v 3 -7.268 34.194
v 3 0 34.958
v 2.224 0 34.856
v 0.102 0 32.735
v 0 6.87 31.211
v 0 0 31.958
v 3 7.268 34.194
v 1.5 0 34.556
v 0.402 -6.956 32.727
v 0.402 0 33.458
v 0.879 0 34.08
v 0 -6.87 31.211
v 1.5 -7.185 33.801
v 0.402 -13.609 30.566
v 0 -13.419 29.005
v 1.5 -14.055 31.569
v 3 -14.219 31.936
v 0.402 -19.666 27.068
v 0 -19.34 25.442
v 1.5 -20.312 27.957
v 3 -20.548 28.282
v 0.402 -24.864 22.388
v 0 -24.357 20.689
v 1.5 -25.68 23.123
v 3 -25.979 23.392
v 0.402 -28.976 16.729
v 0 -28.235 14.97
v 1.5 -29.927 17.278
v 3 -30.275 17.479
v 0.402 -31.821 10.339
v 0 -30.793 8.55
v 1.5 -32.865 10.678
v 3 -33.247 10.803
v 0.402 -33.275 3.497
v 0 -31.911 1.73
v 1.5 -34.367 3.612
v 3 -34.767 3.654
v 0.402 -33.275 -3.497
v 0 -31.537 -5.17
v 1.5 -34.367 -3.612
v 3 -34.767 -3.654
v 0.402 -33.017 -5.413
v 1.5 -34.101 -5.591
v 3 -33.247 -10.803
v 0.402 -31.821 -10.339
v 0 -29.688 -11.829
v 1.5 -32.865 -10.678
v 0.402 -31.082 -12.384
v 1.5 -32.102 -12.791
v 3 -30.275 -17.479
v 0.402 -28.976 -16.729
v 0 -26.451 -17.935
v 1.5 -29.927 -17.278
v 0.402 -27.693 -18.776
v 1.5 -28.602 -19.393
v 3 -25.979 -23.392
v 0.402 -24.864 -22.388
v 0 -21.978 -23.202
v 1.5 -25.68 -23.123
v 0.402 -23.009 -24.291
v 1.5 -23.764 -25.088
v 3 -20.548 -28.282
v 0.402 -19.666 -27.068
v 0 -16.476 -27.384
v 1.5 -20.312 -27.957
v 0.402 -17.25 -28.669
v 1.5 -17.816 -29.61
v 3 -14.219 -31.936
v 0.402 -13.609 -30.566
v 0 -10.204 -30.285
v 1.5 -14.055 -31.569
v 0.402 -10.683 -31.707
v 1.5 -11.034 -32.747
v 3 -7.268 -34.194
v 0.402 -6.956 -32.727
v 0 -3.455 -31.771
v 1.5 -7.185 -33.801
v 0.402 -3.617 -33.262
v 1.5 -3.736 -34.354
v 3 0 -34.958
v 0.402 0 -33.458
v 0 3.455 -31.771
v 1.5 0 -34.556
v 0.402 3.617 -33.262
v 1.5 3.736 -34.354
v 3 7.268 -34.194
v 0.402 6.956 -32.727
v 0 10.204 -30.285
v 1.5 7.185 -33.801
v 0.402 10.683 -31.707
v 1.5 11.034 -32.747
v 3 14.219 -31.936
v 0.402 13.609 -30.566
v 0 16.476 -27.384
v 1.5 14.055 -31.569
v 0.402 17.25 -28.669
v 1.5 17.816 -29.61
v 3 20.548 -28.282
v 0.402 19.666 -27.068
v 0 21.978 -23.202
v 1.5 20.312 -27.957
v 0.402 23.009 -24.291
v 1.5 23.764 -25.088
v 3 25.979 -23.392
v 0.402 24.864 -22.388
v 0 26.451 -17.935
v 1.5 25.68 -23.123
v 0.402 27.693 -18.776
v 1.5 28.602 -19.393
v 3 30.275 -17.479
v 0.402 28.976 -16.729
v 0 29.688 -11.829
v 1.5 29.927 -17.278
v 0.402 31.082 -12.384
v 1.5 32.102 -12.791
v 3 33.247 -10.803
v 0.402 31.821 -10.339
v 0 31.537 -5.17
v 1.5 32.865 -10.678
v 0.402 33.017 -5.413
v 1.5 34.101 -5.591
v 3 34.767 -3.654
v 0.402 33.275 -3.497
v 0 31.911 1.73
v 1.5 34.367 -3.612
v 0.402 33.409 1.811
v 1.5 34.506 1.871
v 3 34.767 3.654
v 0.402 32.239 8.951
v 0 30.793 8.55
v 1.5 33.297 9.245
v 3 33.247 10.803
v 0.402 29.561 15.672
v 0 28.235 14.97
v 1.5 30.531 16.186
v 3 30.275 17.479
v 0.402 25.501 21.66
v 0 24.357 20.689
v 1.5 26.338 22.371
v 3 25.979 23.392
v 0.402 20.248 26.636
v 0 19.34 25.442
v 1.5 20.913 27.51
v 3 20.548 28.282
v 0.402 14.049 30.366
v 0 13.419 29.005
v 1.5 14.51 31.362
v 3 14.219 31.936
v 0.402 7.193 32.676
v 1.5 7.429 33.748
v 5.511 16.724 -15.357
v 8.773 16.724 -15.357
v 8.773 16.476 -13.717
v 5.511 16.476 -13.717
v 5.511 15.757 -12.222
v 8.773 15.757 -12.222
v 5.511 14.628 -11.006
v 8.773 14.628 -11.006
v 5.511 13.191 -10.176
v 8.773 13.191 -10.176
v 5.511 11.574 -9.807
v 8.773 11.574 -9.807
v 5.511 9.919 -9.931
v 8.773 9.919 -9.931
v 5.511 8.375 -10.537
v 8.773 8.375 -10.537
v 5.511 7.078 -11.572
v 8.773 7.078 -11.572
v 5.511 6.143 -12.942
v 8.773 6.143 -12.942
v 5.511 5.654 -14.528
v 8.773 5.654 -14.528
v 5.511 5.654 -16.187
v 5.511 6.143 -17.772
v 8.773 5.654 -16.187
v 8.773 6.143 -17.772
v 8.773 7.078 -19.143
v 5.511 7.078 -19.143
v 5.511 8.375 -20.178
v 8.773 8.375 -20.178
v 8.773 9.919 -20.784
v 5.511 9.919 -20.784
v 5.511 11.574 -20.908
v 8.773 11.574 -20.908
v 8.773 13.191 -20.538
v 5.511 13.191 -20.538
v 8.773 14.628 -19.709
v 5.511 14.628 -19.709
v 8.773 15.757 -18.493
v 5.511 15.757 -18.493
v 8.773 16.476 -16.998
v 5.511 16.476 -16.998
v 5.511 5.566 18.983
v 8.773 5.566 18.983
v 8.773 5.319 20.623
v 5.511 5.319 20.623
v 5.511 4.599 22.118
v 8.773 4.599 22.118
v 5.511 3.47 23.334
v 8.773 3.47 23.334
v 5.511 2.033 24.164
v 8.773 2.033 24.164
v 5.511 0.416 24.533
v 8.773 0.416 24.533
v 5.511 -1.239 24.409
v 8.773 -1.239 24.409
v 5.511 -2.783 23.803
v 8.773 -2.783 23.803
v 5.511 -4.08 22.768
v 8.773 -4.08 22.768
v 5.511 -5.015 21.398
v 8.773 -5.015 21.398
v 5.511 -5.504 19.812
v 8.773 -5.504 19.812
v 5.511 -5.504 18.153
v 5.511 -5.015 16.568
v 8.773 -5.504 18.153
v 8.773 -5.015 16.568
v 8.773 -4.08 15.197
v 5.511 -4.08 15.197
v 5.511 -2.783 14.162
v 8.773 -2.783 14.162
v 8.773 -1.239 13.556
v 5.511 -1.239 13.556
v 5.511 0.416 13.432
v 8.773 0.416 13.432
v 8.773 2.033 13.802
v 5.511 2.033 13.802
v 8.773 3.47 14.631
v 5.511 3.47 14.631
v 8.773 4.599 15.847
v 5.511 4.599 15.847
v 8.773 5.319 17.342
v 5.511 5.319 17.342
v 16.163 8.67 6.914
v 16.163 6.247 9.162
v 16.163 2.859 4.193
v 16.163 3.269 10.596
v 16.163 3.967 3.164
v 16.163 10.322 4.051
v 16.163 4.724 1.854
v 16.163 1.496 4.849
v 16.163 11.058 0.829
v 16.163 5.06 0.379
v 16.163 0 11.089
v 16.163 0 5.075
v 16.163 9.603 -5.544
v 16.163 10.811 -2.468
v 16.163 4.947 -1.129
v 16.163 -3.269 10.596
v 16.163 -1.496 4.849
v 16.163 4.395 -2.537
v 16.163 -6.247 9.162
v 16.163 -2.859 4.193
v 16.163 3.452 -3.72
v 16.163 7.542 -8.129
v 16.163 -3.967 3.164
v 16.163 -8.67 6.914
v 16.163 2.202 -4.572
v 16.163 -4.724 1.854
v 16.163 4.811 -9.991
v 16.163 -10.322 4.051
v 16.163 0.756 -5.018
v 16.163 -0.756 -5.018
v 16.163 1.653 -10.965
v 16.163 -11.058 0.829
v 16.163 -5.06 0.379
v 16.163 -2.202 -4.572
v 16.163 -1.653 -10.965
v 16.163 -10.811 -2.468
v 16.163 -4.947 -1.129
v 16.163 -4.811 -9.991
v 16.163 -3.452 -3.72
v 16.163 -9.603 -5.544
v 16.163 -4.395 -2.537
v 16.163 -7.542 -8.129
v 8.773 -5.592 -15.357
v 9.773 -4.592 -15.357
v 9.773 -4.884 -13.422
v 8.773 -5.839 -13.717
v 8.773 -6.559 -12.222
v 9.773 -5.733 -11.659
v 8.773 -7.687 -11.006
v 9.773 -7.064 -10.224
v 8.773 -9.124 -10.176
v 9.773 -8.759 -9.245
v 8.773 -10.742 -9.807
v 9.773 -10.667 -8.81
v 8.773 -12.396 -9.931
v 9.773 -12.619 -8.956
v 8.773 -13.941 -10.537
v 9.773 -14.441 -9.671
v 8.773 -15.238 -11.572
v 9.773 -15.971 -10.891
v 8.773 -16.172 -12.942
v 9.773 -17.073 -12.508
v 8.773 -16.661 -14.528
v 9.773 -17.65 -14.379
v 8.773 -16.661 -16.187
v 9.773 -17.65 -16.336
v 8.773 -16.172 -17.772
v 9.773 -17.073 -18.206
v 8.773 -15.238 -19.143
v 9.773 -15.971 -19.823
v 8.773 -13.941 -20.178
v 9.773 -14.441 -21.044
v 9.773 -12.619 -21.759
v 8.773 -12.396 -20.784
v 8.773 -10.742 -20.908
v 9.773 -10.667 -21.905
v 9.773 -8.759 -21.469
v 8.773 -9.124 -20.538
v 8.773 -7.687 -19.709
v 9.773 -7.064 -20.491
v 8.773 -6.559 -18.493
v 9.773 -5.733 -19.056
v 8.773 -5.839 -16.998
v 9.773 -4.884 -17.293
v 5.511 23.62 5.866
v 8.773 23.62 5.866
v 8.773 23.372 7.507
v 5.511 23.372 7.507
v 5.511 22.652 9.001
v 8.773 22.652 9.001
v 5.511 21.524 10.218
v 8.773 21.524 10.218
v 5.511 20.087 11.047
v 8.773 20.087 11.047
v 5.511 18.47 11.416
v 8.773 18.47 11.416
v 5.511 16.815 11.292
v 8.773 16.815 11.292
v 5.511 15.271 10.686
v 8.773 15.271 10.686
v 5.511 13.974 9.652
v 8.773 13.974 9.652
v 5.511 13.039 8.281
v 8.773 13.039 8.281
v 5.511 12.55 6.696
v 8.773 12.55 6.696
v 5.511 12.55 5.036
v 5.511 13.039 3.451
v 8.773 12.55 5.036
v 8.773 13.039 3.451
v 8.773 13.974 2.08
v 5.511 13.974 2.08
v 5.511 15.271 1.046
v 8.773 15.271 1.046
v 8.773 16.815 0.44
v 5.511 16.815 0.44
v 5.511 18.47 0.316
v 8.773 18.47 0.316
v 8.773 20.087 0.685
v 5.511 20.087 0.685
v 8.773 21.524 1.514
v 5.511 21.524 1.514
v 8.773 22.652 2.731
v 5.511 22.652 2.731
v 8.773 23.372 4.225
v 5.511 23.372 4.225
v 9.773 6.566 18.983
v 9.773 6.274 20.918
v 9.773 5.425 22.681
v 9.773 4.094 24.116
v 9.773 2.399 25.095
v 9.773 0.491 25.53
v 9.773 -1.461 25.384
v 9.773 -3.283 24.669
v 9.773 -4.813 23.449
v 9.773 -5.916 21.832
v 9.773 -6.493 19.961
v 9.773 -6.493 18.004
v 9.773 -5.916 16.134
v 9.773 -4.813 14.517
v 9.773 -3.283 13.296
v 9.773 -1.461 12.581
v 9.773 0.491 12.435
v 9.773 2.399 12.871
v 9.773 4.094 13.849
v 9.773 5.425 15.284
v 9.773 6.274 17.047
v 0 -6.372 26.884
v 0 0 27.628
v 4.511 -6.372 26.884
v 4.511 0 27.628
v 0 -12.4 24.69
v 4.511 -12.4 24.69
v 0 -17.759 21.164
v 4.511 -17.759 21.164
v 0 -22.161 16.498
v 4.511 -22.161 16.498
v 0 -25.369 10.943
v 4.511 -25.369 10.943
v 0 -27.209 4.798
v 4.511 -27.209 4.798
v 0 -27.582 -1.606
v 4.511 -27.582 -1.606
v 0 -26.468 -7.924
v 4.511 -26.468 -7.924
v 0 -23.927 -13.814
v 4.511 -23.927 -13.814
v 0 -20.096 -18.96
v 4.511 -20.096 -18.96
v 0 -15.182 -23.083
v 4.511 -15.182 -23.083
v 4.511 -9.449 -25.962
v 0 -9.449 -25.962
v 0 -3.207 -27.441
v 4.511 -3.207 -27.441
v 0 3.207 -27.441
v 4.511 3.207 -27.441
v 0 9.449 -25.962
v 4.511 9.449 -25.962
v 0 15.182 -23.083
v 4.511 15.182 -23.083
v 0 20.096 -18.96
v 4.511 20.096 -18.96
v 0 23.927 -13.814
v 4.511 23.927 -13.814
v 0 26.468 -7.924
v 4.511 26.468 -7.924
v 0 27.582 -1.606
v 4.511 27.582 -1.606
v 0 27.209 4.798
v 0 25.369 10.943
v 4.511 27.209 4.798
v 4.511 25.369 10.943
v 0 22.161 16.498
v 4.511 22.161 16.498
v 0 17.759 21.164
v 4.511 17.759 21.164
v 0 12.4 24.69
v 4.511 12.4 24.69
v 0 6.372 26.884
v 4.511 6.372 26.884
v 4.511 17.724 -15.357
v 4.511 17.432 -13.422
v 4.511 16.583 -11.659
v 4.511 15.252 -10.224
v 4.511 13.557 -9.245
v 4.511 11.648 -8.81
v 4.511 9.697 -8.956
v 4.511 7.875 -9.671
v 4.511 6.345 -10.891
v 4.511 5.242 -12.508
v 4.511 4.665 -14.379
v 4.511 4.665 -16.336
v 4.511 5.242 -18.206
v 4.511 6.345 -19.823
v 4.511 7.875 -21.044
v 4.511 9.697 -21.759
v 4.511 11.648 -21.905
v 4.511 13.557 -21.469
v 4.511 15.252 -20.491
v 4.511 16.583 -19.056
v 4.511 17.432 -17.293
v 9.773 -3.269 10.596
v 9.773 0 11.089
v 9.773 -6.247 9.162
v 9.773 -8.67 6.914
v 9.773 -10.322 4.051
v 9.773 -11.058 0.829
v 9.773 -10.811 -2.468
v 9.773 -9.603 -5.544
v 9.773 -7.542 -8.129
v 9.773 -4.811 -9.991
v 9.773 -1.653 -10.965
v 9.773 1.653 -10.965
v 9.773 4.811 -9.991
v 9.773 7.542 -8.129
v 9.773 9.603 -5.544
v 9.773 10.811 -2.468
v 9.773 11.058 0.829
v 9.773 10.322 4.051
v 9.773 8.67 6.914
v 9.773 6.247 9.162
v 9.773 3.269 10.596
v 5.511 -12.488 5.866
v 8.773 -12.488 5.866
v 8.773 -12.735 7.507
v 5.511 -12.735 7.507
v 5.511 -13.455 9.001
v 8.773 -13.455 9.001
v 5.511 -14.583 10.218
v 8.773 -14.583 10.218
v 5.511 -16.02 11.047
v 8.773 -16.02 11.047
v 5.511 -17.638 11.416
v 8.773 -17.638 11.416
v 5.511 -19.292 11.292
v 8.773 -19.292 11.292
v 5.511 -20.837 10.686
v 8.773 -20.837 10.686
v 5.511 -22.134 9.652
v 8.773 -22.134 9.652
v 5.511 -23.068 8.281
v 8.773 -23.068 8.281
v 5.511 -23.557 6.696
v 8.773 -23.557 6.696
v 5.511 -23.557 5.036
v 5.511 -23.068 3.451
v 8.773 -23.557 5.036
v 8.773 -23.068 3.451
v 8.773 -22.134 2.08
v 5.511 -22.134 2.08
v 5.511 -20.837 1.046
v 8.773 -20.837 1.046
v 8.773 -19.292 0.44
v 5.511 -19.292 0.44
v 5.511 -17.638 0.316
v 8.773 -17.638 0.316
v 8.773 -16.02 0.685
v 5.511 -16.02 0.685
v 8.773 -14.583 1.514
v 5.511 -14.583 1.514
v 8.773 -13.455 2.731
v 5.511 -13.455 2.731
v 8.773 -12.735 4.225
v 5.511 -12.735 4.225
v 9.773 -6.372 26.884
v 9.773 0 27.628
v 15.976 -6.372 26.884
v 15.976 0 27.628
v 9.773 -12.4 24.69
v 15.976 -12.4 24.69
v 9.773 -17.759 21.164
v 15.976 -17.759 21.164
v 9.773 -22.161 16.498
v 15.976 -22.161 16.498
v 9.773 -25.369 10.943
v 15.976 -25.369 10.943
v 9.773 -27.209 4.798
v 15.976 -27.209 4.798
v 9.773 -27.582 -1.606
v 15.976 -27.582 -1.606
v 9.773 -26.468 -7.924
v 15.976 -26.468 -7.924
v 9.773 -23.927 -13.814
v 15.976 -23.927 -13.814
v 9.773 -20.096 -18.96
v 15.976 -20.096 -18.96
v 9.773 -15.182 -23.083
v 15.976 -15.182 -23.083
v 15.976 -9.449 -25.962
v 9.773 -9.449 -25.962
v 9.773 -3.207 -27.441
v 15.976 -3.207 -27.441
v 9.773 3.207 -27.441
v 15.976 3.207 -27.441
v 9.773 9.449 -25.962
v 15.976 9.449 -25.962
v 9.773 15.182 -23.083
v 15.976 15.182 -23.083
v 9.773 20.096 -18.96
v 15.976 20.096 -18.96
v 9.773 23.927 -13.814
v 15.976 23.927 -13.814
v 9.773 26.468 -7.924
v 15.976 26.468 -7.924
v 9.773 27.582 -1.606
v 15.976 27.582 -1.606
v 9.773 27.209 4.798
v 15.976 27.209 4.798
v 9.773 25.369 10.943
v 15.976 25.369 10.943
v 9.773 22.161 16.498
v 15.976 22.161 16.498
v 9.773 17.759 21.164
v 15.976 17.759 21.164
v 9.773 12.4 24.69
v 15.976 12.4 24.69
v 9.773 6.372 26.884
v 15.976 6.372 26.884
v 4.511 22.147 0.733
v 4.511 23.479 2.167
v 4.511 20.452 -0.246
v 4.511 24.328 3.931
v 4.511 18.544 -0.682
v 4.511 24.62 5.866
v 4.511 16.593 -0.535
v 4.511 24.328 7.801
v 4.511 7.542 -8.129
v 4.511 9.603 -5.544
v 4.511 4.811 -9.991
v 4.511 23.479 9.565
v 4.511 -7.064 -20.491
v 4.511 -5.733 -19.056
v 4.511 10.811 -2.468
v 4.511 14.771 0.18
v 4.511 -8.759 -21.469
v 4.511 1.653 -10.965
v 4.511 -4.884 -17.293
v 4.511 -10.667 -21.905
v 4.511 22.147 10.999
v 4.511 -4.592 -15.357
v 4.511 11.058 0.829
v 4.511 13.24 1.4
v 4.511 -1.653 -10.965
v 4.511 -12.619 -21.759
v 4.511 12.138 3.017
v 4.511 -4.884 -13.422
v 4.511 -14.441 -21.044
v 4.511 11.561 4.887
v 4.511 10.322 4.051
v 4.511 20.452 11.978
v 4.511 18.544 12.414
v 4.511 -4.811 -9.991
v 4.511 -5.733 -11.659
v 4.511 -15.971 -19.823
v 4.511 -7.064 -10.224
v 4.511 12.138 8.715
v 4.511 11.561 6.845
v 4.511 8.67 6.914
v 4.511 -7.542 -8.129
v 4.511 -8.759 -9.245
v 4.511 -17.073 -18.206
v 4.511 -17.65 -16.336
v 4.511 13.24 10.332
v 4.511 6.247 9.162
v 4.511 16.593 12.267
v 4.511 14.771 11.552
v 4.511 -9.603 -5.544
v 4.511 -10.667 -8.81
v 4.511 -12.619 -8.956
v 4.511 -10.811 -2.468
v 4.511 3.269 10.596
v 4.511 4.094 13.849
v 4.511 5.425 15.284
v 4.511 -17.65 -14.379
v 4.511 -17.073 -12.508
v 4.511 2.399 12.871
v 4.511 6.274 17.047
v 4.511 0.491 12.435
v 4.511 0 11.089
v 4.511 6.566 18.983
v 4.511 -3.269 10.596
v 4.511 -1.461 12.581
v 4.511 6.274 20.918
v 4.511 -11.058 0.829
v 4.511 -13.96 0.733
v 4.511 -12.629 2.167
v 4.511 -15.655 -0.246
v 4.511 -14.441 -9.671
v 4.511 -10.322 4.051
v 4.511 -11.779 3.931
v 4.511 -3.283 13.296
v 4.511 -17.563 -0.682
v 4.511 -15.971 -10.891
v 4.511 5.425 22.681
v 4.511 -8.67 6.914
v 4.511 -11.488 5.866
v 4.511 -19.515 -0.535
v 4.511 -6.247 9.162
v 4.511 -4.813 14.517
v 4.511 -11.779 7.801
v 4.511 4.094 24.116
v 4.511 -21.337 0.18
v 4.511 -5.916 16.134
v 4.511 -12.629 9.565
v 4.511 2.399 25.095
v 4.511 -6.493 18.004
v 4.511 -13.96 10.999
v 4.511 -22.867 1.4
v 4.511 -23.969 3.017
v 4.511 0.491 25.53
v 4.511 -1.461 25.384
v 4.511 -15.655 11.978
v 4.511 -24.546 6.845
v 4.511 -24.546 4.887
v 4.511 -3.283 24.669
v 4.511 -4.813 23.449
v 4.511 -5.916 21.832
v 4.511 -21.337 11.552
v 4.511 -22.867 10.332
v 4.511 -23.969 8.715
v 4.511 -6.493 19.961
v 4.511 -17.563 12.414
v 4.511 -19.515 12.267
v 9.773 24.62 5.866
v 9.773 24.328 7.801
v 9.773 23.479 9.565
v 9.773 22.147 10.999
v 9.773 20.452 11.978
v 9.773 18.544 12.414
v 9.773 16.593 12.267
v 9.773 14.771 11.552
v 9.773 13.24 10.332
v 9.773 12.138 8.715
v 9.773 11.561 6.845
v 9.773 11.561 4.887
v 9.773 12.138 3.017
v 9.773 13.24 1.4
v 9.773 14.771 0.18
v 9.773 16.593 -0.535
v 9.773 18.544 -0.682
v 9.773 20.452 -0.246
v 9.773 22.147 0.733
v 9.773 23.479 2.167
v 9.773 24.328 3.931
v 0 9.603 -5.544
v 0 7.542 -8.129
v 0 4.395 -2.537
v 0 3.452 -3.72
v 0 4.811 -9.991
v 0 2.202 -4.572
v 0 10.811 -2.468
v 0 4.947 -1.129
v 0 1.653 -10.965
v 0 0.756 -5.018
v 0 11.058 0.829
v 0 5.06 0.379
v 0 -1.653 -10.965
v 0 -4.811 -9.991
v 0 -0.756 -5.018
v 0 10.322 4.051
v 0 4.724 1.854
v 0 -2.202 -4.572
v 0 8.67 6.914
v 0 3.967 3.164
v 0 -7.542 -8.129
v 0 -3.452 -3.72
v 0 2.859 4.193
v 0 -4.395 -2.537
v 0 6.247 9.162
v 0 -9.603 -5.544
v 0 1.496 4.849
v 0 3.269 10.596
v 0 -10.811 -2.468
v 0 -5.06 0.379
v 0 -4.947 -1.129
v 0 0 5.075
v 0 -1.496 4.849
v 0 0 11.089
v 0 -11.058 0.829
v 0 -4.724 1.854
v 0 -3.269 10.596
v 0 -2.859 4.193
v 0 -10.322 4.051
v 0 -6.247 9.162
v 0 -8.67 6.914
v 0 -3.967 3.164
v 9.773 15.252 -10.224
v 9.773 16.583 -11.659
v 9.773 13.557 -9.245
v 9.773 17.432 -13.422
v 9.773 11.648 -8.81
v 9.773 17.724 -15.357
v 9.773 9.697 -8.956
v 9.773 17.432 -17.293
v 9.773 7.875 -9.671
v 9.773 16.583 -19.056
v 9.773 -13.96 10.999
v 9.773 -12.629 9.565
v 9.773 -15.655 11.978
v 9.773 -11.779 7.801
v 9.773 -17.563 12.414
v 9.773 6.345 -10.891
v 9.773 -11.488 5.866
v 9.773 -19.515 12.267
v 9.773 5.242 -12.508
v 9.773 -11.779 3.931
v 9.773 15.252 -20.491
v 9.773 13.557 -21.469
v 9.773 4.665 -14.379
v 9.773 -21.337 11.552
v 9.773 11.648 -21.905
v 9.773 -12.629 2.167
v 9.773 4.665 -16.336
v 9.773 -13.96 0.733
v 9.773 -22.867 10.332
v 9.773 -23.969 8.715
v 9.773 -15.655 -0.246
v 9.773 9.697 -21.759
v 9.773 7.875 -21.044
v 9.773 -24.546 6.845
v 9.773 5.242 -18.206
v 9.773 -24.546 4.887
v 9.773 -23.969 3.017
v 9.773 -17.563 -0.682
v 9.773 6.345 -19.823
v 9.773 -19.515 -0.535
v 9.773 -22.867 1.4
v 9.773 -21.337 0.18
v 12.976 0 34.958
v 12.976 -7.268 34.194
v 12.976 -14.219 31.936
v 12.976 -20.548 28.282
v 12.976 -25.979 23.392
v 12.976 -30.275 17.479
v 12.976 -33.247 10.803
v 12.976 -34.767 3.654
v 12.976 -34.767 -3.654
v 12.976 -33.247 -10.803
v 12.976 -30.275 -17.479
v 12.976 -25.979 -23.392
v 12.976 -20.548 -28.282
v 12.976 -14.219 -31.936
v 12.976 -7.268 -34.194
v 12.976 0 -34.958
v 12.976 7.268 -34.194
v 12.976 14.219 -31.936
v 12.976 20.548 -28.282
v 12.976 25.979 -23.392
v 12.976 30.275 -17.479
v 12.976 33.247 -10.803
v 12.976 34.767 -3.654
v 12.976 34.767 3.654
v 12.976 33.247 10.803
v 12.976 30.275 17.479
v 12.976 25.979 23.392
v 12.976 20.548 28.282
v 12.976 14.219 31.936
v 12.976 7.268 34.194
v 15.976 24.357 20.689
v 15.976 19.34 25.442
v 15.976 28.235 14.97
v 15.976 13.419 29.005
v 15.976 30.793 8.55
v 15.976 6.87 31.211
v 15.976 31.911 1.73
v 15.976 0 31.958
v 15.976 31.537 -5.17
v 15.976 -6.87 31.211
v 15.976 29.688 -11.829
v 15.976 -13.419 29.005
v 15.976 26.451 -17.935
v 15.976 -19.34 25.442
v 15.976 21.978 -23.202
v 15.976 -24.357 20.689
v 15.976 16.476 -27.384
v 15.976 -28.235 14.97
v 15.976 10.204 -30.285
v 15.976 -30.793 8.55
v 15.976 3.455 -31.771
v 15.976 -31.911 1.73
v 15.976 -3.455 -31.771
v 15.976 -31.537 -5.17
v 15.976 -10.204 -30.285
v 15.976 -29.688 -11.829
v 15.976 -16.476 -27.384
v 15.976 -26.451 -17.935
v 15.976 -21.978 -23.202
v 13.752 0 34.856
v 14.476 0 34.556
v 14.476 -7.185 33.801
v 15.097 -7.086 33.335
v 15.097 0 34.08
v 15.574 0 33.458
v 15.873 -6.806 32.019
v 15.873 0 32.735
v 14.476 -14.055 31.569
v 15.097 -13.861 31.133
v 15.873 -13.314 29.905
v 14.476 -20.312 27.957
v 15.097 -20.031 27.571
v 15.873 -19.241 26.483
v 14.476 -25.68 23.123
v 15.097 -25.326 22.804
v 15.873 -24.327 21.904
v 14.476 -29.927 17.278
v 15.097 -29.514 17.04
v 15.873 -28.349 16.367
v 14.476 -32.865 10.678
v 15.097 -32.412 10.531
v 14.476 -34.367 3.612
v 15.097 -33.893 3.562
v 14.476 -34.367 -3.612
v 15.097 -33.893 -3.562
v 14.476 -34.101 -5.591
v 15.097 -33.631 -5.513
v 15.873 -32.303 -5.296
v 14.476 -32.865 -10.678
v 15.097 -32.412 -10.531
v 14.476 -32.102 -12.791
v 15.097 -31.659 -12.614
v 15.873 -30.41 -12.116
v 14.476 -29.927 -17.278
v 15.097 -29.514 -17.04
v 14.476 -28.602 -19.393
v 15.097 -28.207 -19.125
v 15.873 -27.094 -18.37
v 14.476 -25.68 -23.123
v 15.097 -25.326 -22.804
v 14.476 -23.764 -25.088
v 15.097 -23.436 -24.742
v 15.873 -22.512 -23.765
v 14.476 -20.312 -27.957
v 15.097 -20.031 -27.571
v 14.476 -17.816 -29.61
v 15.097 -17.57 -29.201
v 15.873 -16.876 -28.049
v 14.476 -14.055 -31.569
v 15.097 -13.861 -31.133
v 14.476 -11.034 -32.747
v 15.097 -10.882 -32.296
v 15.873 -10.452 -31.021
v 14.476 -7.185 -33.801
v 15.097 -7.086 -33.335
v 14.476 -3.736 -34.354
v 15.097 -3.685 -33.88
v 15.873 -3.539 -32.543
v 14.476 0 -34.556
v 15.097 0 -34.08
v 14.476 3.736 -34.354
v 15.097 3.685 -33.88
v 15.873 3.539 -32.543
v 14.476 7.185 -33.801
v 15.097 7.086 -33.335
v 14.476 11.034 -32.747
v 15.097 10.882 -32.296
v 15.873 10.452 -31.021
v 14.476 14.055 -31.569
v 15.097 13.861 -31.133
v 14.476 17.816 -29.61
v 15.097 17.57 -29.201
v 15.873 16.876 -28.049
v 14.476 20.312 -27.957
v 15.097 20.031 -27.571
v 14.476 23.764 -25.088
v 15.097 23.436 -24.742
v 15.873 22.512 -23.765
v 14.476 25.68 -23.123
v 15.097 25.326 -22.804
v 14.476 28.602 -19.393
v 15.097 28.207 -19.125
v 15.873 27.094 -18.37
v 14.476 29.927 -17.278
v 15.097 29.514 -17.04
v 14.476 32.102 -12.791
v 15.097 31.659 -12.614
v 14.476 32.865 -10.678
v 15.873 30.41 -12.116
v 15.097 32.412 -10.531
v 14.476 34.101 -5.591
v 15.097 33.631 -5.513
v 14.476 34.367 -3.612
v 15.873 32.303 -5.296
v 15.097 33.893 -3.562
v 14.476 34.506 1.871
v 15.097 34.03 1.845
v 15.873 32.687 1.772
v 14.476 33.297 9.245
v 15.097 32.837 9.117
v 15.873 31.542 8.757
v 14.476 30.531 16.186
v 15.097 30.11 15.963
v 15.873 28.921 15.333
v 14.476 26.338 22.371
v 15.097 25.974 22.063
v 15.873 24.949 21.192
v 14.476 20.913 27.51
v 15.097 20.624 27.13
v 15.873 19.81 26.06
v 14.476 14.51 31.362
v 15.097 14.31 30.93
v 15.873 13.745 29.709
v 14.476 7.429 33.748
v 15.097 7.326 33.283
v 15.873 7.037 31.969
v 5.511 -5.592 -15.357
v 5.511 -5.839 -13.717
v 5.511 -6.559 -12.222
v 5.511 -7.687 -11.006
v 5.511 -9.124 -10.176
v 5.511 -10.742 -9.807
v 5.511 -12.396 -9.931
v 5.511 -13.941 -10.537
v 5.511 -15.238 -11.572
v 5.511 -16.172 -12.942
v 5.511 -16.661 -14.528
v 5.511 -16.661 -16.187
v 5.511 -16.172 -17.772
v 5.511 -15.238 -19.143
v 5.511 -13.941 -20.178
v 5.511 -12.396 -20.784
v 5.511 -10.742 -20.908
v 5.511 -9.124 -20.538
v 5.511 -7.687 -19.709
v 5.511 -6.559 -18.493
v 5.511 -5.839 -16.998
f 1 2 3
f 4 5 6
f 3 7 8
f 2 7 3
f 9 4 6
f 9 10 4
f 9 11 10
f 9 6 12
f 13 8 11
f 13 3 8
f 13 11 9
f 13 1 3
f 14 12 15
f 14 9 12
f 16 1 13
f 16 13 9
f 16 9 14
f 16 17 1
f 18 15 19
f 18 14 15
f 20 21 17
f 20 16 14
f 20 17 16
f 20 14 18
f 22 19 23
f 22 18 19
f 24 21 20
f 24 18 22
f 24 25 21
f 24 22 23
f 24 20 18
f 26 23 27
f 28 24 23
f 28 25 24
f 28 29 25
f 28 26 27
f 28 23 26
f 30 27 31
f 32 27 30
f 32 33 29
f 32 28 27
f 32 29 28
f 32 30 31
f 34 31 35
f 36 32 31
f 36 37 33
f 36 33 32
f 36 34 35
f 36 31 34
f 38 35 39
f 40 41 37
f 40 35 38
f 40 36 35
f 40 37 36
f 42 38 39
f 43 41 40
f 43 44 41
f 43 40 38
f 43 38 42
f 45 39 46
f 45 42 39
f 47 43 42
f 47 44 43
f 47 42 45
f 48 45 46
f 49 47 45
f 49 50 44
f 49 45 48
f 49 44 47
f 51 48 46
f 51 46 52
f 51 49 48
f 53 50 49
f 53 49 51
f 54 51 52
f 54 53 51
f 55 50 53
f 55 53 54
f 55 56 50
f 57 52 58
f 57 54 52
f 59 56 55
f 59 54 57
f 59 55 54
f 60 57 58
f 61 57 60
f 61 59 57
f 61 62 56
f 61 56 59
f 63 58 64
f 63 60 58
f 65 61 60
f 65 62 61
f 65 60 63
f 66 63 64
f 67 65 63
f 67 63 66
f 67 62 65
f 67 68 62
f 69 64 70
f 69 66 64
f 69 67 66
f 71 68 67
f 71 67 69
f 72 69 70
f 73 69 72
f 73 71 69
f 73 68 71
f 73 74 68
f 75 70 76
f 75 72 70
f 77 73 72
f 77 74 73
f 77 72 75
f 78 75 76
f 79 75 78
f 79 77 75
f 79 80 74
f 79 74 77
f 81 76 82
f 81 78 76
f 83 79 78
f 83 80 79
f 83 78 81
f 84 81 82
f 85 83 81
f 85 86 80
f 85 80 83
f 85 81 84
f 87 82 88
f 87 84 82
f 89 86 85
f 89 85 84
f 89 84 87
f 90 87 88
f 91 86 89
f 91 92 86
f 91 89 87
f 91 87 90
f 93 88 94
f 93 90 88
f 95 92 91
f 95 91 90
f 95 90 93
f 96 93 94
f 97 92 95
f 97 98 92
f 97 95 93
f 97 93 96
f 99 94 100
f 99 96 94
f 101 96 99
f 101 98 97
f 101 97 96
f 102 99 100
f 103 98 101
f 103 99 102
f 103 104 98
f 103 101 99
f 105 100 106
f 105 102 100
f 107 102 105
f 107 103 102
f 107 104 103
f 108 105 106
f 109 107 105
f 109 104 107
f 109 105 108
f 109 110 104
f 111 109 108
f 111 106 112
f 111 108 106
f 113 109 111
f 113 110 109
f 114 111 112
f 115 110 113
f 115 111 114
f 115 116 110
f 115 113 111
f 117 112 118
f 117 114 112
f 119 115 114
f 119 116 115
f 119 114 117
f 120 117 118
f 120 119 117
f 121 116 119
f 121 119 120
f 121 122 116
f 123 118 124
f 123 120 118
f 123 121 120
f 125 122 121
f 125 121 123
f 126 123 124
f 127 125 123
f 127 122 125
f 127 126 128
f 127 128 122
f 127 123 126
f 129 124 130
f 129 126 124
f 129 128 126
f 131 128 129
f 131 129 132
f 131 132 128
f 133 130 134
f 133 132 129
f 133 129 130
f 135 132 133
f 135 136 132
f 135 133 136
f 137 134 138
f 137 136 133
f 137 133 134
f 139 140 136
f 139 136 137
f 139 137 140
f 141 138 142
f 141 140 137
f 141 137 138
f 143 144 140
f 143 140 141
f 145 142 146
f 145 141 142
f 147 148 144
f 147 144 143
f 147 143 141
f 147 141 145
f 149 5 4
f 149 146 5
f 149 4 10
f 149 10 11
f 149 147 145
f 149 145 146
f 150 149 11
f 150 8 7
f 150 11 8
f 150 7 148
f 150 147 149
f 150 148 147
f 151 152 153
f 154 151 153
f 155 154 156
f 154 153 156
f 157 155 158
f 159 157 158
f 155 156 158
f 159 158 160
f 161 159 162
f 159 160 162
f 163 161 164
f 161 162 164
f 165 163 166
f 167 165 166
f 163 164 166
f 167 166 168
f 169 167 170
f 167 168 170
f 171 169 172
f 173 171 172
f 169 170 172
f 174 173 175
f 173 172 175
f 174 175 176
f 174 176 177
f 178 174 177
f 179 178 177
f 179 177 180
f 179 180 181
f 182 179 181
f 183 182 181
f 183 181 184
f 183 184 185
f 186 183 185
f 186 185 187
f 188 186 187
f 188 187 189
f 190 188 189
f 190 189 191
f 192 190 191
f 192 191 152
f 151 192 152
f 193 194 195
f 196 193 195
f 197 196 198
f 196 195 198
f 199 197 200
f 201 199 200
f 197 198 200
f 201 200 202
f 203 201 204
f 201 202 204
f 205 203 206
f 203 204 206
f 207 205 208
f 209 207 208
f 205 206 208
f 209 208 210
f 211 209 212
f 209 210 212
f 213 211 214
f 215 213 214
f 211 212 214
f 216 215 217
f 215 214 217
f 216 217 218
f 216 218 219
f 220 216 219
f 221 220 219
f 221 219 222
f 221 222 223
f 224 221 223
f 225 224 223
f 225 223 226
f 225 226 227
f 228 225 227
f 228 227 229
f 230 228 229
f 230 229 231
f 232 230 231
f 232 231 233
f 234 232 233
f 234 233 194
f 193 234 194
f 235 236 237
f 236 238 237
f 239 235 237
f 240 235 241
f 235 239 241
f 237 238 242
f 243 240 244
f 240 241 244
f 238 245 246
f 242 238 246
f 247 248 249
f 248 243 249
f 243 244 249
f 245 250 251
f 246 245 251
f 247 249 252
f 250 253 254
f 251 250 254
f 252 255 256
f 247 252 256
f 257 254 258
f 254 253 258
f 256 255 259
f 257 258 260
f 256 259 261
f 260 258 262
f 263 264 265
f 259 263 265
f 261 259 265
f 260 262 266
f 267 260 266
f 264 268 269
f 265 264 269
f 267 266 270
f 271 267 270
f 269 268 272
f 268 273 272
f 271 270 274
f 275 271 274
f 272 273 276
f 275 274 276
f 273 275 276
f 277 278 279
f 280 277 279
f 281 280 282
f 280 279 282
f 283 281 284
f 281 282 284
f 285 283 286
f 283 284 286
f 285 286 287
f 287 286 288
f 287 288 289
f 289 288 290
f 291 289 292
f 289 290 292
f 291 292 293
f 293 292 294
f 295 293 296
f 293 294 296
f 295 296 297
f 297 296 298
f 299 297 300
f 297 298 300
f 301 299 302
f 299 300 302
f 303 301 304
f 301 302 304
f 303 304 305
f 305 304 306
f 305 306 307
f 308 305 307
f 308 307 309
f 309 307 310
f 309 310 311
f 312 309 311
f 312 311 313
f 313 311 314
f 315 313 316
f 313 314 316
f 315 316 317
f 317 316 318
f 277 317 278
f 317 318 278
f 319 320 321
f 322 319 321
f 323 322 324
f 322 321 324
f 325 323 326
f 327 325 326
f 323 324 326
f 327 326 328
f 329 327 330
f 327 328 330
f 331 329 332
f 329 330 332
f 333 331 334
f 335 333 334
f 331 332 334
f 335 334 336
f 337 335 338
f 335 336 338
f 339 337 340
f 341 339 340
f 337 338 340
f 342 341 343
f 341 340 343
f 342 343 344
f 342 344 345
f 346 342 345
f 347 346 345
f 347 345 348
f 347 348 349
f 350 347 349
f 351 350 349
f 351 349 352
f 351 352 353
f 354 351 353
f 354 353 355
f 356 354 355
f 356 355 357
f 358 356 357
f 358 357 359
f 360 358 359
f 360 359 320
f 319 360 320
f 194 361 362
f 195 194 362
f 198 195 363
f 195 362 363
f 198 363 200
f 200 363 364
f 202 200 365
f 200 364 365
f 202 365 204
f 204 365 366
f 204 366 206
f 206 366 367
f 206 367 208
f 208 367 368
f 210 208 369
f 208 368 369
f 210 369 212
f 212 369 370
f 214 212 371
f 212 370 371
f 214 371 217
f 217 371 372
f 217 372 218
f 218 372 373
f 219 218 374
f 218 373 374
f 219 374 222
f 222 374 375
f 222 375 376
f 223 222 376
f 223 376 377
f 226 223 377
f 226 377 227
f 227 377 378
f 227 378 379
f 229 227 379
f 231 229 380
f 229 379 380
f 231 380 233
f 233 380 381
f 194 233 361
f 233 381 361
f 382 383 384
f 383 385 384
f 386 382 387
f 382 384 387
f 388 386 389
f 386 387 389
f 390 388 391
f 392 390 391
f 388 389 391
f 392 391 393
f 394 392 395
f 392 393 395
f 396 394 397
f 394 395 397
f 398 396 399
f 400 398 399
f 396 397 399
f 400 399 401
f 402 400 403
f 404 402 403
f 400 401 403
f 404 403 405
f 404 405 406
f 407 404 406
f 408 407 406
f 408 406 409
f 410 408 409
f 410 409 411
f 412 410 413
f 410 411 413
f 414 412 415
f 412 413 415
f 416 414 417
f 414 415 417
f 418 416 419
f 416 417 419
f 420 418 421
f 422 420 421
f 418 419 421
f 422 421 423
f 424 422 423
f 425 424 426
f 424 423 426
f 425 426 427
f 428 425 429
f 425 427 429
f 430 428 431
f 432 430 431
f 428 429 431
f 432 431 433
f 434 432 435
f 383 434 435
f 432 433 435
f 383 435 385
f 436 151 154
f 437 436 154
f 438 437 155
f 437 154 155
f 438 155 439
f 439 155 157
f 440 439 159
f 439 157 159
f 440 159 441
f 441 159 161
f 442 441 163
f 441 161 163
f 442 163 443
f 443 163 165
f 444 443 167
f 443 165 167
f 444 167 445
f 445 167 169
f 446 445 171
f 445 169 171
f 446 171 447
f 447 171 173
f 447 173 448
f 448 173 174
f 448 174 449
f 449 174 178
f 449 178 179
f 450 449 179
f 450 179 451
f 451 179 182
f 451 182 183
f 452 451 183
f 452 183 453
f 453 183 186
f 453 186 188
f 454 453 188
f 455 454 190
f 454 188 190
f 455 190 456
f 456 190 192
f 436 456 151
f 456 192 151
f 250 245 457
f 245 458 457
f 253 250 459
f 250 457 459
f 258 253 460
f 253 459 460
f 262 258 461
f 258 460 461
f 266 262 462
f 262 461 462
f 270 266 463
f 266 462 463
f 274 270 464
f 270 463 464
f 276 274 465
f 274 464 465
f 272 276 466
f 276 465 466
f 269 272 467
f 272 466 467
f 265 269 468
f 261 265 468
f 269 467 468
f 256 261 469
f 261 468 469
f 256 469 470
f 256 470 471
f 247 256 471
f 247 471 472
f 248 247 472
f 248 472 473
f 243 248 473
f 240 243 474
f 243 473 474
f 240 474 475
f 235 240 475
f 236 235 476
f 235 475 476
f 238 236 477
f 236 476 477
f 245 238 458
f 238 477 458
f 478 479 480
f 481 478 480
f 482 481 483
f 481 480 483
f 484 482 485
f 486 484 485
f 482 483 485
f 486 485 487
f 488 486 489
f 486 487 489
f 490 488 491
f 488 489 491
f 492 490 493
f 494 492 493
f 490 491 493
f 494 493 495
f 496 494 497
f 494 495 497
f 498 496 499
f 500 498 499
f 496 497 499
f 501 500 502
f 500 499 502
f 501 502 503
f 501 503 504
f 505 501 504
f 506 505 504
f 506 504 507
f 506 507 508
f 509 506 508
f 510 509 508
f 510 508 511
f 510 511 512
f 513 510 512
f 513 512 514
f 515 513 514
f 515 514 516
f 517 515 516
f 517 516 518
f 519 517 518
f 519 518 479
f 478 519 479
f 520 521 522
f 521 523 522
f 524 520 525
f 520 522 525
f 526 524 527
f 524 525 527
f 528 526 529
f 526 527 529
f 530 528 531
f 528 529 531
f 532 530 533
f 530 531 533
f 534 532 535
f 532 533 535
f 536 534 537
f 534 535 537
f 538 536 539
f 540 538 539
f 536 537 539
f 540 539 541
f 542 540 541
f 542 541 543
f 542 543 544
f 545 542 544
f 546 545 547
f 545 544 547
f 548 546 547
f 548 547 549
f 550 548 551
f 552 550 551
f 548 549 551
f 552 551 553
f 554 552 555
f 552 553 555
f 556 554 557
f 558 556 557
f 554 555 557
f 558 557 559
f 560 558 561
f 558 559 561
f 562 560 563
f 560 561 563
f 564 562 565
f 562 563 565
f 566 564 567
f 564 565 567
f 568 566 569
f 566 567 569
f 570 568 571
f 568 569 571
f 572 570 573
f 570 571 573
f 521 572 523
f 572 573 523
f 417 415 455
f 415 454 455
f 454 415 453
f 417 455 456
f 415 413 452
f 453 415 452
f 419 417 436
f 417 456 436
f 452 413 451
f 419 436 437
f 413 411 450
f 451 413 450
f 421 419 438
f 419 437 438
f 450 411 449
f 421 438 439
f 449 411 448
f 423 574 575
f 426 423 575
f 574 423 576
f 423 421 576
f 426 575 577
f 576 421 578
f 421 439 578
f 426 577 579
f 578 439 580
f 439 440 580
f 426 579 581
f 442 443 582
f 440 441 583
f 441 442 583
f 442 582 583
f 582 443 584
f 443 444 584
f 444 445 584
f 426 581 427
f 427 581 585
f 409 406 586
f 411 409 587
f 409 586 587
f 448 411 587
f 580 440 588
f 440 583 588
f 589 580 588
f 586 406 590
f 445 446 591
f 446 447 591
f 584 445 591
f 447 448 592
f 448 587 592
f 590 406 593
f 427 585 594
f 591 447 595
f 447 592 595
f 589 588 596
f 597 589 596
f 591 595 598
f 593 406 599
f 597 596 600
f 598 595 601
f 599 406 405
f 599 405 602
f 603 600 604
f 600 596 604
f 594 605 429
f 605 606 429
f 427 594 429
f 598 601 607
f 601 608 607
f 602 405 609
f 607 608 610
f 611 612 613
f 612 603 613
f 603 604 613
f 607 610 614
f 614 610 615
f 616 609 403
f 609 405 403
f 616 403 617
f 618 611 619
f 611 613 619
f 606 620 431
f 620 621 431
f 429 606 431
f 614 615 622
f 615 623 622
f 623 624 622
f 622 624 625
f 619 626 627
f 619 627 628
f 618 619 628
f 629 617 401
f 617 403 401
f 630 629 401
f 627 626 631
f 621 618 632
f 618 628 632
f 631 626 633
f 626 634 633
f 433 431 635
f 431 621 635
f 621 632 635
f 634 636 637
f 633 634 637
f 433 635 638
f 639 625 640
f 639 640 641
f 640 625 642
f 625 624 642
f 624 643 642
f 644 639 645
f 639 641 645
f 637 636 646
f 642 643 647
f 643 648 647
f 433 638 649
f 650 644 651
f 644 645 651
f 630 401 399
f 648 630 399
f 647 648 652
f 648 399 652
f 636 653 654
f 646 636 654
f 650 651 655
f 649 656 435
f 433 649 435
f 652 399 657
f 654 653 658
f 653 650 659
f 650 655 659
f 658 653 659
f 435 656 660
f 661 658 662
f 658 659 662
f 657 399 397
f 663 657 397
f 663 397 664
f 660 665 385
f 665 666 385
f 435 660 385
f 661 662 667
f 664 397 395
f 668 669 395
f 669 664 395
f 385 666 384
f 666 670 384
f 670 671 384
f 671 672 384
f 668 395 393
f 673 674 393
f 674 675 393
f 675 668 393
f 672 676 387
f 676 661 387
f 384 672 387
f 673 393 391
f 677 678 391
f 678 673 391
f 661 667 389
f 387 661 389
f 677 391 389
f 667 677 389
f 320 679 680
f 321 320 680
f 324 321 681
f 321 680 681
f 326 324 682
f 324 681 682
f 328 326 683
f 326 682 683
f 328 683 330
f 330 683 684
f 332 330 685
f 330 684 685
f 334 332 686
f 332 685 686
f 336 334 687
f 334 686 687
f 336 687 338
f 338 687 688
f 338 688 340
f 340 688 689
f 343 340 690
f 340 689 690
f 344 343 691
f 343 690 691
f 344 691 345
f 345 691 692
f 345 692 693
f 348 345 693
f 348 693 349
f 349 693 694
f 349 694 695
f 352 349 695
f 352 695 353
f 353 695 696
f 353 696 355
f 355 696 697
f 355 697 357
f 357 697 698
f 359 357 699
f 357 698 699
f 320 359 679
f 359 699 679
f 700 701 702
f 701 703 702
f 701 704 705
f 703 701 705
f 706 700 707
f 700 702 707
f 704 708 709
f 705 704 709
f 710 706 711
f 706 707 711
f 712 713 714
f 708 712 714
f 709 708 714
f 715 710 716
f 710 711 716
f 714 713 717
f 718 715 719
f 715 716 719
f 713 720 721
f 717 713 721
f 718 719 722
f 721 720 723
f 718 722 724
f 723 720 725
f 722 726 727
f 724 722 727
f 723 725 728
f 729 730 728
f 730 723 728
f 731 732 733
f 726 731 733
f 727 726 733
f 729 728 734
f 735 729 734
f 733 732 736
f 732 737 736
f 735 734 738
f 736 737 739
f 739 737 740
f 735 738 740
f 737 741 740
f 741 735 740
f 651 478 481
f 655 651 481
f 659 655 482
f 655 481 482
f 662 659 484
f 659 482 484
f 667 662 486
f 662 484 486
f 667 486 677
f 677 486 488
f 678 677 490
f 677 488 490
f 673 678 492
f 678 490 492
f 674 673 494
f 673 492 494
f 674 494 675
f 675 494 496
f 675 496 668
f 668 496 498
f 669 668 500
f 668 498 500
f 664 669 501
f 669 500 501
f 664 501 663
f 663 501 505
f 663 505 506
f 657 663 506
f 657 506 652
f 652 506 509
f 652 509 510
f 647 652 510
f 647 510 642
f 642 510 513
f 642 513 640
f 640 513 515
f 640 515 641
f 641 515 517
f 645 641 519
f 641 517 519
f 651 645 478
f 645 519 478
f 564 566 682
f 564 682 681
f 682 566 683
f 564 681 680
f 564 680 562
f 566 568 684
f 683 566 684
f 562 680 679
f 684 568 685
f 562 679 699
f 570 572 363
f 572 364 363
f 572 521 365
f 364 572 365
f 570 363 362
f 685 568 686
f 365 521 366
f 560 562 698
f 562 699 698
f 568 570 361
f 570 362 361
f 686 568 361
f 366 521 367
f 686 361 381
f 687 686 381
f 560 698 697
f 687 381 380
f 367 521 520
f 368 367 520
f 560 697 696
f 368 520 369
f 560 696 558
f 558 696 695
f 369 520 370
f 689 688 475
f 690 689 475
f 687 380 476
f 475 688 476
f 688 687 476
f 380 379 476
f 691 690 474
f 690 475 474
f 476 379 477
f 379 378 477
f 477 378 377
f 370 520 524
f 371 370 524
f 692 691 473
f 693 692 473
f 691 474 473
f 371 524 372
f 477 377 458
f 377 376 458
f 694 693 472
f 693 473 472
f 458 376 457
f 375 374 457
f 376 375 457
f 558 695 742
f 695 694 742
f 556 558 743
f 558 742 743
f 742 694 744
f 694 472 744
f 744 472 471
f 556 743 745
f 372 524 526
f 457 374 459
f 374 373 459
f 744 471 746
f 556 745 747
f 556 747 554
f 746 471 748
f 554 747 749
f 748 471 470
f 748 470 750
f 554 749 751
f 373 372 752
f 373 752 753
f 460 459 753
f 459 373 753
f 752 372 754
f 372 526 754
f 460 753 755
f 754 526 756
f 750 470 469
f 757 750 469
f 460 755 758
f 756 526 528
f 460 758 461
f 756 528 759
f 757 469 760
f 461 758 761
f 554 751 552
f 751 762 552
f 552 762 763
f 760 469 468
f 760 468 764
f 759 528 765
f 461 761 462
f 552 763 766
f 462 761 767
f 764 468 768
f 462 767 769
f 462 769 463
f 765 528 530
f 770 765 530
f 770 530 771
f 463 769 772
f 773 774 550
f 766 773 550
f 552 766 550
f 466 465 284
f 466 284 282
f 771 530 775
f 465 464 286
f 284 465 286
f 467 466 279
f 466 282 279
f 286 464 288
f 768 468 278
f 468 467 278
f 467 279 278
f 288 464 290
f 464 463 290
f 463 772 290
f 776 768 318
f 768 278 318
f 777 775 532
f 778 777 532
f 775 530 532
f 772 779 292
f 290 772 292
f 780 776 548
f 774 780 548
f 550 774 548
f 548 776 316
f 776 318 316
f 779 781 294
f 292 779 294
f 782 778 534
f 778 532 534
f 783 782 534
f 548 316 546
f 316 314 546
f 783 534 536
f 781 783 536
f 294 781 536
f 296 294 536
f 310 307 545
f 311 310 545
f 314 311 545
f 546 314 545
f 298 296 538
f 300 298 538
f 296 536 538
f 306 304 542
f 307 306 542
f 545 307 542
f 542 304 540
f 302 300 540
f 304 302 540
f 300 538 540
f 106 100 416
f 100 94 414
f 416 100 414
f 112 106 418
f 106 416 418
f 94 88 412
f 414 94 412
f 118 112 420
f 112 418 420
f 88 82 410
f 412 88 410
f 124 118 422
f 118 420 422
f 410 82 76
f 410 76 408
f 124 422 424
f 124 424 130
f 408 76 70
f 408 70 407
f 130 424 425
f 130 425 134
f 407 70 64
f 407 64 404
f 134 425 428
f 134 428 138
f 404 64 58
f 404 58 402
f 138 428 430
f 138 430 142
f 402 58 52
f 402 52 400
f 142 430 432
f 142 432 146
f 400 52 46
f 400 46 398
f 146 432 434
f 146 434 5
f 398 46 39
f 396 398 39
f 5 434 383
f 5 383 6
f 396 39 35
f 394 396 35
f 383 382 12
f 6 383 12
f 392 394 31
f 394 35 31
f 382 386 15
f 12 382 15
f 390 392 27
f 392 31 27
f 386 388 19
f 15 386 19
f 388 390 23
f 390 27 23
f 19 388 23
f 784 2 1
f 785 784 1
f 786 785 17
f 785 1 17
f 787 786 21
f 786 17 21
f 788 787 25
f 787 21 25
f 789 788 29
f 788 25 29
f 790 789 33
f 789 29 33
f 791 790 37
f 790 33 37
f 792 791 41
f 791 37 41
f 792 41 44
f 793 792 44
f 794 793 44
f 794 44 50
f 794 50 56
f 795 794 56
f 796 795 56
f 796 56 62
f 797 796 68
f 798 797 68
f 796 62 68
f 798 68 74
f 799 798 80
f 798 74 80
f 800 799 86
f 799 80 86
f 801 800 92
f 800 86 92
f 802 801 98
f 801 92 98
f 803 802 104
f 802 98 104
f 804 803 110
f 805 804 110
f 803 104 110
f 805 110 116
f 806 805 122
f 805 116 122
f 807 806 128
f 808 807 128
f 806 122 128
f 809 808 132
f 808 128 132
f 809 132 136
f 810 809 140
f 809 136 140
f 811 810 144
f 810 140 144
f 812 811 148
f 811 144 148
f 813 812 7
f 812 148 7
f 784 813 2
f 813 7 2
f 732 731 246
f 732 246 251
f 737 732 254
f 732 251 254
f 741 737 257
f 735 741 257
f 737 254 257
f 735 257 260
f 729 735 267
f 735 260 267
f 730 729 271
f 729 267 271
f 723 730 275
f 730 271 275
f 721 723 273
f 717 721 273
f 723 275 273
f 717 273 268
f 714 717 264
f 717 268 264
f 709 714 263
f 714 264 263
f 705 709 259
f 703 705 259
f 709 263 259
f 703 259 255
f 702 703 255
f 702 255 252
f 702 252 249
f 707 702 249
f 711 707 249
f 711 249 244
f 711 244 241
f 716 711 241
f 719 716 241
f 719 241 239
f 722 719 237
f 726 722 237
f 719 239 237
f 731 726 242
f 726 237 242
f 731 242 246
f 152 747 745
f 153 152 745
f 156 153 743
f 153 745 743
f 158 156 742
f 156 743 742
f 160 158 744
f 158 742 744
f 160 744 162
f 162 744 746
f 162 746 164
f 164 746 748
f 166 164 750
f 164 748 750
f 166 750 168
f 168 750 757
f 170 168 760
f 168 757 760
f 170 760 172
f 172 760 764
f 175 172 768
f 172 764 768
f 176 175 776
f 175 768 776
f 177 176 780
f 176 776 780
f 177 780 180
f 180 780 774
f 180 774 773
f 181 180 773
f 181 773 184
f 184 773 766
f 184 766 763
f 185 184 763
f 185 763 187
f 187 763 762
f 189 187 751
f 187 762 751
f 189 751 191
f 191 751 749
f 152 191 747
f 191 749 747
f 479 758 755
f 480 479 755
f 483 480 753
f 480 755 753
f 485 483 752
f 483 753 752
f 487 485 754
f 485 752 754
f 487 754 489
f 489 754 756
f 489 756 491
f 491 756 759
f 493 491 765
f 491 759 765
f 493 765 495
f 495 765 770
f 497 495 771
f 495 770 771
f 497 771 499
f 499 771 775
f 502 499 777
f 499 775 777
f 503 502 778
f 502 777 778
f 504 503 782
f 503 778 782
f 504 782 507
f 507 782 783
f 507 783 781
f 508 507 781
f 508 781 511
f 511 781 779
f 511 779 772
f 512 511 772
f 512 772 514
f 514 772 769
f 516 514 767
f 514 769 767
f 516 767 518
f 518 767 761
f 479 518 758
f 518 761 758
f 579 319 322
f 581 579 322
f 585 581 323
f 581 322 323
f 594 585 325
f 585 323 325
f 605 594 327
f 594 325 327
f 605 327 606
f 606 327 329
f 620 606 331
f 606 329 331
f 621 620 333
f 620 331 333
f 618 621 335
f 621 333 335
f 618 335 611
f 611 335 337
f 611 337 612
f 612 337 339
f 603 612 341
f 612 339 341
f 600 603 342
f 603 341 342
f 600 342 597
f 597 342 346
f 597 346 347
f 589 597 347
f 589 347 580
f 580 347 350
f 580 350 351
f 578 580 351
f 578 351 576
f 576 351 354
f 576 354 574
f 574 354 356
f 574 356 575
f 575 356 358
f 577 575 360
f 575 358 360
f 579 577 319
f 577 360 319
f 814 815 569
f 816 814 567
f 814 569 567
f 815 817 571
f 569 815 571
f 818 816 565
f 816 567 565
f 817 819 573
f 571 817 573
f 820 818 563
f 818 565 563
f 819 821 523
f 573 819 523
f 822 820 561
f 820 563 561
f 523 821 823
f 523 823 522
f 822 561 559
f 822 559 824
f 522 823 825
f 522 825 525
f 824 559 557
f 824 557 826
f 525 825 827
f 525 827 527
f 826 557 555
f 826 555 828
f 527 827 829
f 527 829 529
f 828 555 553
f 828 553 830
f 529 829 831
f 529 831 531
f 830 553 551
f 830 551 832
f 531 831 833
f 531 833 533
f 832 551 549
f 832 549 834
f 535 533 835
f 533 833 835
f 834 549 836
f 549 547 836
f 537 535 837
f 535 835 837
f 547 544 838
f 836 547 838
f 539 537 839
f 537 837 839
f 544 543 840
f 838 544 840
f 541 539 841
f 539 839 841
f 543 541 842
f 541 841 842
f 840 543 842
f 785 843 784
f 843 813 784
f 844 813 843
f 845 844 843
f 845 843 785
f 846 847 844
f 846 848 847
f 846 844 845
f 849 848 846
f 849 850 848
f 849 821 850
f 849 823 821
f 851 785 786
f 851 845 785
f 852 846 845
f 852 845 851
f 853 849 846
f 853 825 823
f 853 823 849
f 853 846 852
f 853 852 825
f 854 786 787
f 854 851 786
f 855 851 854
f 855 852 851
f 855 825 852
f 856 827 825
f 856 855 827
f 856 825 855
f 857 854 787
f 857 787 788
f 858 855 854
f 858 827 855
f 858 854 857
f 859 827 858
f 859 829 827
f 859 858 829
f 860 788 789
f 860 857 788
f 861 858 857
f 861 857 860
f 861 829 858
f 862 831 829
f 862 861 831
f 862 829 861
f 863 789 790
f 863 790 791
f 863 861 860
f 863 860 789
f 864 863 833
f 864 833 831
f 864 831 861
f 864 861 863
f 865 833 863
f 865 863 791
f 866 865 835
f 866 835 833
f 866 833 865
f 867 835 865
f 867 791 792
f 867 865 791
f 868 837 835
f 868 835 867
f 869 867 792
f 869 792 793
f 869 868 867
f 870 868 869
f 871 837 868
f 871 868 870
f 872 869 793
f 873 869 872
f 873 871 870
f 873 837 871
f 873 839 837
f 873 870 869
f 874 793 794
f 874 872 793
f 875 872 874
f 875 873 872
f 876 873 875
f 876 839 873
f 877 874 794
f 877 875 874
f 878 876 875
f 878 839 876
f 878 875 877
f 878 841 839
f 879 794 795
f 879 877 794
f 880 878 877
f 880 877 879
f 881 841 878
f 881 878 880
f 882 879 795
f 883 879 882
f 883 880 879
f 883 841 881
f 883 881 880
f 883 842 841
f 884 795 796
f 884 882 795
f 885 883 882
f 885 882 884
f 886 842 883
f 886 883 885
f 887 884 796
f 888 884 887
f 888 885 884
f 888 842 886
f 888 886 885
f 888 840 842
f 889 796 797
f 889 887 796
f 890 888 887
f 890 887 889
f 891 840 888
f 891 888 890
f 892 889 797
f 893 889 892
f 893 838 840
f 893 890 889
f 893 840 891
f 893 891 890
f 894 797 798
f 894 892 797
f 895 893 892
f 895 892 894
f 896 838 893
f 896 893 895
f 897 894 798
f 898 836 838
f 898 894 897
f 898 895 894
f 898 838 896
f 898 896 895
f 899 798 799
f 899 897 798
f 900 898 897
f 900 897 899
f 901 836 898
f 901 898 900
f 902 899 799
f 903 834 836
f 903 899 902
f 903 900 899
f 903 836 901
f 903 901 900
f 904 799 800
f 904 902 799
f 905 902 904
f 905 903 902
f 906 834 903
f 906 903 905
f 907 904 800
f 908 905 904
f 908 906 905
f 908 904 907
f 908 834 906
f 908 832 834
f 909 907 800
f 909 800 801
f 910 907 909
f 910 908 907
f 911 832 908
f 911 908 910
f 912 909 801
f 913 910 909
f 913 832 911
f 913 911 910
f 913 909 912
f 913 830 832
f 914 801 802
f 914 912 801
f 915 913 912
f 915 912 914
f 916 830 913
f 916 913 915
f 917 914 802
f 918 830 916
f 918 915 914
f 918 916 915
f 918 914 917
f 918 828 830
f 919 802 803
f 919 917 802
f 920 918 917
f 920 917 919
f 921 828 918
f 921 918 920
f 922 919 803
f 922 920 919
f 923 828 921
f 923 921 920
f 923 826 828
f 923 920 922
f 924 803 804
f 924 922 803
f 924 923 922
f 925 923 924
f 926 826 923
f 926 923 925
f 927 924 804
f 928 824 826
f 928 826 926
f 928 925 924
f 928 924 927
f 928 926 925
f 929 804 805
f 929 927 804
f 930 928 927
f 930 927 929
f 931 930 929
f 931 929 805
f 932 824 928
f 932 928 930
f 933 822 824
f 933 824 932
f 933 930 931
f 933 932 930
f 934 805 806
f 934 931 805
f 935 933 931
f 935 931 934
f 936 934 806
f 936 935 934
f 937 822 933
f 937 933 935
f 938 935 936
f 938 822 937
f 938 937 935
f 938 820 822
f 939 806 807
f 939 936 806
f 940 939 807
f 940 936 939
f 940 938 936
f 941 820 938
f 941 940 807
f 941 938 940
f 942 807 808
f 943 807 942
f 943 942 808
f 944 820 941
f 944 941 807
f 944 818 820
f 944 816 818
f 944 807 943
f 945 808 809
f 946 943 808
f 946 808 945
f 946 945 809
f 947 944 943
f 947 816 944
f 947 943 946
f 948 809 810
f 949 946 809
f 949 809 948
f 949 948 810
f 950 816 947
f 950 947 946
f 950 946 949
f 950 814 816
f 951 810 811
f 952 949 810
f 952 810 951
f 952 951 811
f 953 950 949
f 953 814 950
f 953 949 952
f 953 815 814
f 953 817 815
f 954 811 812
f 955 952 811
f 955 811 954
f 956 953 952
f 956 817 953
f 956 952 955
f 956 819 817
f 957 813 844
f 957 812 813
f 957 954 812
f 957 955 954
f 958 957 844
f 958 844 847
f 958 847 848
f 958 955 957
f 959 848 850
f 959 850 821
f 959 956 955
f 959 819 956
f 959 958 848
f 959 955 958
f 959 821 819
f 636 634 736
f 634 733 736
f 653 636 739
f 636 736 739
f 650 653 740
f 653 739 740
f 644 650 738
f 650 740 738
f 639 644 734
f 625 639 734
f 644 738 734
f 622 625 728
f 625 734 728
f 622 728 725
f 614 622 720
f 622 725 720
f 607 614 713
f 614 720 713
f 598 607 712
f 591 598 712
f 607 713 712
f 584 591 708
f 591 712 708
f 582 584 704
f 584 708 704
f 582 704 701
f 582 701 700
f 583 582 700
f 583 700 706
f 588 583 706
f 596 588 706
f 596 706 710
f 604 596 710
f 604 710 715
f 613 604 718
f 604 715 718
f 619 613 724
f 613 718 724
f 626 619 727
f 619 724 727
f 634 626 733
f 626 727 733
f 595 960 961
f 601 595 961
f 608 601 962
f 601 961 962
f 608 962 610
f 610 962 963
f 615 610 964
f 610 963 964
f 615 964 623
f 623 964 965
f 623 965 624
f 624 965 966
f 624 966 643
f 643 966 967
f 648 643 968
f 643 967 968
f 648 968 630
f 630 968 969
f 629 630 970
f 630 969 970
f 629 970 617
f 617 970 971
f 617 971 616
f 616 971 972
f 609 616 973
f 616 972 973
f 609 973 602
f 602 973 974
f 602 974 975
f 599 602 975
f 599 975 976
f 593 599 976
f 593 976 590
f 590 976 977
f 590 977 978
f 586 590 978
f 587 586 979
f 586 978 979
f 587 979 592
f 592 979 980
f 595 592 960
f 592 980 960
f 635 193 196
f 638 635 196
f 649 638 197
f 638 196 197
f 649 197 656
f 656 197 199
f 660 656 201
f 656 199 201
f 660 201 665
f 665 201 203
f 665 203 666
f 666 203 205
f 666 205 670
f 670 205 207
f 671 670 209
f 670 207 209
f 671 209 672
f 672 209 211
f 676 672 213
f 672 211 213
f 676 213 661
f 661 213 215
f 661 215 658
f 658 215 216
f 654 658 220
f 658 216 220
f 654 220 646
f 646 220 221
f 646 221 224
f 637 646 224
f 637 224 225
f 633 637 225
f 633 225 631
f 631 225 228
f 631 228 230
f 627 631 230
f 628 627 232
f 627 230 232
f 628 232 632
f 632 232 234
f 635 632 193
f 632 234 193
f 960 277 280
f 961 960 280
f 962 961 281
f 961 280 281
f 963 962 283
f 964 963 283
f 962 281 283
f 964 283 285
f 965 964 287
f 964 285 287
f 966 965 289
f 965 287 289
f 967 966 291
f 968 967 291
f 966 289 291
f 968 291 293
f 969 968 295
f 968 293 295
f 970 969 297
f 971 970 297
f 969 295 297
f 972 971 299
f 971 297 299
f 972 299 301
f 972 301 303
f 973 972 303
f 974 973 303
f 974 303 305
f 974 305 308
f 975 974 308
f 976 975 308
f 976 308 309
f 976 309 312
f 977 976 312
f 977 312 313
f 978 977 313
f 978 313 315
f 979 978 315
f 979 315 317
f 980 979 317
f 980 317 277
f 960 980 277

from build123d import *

# Parameters (mm, degrees)
F2_R     = 5.5659119411
F3_DEPTH = 25
F4_R     = 3
F5_SIZE  = 1


with BuildPart() as f1:
    # F0 (on Front) → F1 (revolve)
    with BuildSketch(Plane.XZ):
        Polygon((0, 11.0889025964), (0, 5.0745825283), (16.1634832621, 5.0745825283), (16.1634832621, 11.0889025964), (9.7732706927, 11.0889025964), (9.7732706927, 27.6282825507), (15.9755358472, 27.6282825507), (15.9755358472, 34.9582345225), (0, 34.9582345225), (0, 27.6282825507), (4.5107388869, 27.6282825507), (4.5107388869, 11.0889025964), align=None)
    revolve(axis=Axis((18.8887231052, 0, 0), (1, 0, 0)))

    # F2 (on face) → F3 (cut)
    with BuildSketch(Plane.YZ.offset(9.7732706927)):
        with Locations((0, 18.9826972783)):
            Circle(F2_R)
        with Locations((18.0536179433, 5.8659760581)):
            Circle(F2_R)
        with Locations((11.1577495089, -15.3573246972)):
            Circle(F2_R)
        with Locations((-18.0536179433, 5.8659760581)):
            Circle(F2_R)
        with Locations((-11.1577495089, -15.3573246972)):
            Circle(F2_R)
    extrude(amount=-F3_DEPTH, mode=Mode.SUBTRACT)

    # F4
    f4_edges = [f1.edges().sort_by_distance(p)[0] for p in [
        (15.975536, 0, -34.958235),
        (0, 0, -34.958235),
    ]]
    fillet(f4_edges, radius=F4_R)

    # F5
    f5_edges = [f1.edges().sort_by_distance(p)[0] for p in [
        (9.773271, 12.487706, 5.865976),
        (9.773271, -5.565912, 18.982697),
        (7.142005, 5.565912, 18.982697),
        (4.510739, -5.565912, 18.982697),
        (9.773271, -23.61953, 5.865976),
        (7.142005, -12.487706, 5.865976),
        (4.510739, -23.61953, 5.865976),
        (9.773271, -16.723661, -15.357325),
        (7.142005, -5.591838, -15.357325),
        (4.510739, -16.723661, -15.357325),
        (9.773271, 5.591838, -15.357325),
        (7.142005, 16.723661, -15.357325),
        (4.510739, 5.591838, -15.357325),
        (7.142005, 23.61953, 5.865976),
        (4.510739, 12.487706, 5.865976),
    ]]
    chamfer(f5_edges, length=F5_SIZE)


solid = f1.part
